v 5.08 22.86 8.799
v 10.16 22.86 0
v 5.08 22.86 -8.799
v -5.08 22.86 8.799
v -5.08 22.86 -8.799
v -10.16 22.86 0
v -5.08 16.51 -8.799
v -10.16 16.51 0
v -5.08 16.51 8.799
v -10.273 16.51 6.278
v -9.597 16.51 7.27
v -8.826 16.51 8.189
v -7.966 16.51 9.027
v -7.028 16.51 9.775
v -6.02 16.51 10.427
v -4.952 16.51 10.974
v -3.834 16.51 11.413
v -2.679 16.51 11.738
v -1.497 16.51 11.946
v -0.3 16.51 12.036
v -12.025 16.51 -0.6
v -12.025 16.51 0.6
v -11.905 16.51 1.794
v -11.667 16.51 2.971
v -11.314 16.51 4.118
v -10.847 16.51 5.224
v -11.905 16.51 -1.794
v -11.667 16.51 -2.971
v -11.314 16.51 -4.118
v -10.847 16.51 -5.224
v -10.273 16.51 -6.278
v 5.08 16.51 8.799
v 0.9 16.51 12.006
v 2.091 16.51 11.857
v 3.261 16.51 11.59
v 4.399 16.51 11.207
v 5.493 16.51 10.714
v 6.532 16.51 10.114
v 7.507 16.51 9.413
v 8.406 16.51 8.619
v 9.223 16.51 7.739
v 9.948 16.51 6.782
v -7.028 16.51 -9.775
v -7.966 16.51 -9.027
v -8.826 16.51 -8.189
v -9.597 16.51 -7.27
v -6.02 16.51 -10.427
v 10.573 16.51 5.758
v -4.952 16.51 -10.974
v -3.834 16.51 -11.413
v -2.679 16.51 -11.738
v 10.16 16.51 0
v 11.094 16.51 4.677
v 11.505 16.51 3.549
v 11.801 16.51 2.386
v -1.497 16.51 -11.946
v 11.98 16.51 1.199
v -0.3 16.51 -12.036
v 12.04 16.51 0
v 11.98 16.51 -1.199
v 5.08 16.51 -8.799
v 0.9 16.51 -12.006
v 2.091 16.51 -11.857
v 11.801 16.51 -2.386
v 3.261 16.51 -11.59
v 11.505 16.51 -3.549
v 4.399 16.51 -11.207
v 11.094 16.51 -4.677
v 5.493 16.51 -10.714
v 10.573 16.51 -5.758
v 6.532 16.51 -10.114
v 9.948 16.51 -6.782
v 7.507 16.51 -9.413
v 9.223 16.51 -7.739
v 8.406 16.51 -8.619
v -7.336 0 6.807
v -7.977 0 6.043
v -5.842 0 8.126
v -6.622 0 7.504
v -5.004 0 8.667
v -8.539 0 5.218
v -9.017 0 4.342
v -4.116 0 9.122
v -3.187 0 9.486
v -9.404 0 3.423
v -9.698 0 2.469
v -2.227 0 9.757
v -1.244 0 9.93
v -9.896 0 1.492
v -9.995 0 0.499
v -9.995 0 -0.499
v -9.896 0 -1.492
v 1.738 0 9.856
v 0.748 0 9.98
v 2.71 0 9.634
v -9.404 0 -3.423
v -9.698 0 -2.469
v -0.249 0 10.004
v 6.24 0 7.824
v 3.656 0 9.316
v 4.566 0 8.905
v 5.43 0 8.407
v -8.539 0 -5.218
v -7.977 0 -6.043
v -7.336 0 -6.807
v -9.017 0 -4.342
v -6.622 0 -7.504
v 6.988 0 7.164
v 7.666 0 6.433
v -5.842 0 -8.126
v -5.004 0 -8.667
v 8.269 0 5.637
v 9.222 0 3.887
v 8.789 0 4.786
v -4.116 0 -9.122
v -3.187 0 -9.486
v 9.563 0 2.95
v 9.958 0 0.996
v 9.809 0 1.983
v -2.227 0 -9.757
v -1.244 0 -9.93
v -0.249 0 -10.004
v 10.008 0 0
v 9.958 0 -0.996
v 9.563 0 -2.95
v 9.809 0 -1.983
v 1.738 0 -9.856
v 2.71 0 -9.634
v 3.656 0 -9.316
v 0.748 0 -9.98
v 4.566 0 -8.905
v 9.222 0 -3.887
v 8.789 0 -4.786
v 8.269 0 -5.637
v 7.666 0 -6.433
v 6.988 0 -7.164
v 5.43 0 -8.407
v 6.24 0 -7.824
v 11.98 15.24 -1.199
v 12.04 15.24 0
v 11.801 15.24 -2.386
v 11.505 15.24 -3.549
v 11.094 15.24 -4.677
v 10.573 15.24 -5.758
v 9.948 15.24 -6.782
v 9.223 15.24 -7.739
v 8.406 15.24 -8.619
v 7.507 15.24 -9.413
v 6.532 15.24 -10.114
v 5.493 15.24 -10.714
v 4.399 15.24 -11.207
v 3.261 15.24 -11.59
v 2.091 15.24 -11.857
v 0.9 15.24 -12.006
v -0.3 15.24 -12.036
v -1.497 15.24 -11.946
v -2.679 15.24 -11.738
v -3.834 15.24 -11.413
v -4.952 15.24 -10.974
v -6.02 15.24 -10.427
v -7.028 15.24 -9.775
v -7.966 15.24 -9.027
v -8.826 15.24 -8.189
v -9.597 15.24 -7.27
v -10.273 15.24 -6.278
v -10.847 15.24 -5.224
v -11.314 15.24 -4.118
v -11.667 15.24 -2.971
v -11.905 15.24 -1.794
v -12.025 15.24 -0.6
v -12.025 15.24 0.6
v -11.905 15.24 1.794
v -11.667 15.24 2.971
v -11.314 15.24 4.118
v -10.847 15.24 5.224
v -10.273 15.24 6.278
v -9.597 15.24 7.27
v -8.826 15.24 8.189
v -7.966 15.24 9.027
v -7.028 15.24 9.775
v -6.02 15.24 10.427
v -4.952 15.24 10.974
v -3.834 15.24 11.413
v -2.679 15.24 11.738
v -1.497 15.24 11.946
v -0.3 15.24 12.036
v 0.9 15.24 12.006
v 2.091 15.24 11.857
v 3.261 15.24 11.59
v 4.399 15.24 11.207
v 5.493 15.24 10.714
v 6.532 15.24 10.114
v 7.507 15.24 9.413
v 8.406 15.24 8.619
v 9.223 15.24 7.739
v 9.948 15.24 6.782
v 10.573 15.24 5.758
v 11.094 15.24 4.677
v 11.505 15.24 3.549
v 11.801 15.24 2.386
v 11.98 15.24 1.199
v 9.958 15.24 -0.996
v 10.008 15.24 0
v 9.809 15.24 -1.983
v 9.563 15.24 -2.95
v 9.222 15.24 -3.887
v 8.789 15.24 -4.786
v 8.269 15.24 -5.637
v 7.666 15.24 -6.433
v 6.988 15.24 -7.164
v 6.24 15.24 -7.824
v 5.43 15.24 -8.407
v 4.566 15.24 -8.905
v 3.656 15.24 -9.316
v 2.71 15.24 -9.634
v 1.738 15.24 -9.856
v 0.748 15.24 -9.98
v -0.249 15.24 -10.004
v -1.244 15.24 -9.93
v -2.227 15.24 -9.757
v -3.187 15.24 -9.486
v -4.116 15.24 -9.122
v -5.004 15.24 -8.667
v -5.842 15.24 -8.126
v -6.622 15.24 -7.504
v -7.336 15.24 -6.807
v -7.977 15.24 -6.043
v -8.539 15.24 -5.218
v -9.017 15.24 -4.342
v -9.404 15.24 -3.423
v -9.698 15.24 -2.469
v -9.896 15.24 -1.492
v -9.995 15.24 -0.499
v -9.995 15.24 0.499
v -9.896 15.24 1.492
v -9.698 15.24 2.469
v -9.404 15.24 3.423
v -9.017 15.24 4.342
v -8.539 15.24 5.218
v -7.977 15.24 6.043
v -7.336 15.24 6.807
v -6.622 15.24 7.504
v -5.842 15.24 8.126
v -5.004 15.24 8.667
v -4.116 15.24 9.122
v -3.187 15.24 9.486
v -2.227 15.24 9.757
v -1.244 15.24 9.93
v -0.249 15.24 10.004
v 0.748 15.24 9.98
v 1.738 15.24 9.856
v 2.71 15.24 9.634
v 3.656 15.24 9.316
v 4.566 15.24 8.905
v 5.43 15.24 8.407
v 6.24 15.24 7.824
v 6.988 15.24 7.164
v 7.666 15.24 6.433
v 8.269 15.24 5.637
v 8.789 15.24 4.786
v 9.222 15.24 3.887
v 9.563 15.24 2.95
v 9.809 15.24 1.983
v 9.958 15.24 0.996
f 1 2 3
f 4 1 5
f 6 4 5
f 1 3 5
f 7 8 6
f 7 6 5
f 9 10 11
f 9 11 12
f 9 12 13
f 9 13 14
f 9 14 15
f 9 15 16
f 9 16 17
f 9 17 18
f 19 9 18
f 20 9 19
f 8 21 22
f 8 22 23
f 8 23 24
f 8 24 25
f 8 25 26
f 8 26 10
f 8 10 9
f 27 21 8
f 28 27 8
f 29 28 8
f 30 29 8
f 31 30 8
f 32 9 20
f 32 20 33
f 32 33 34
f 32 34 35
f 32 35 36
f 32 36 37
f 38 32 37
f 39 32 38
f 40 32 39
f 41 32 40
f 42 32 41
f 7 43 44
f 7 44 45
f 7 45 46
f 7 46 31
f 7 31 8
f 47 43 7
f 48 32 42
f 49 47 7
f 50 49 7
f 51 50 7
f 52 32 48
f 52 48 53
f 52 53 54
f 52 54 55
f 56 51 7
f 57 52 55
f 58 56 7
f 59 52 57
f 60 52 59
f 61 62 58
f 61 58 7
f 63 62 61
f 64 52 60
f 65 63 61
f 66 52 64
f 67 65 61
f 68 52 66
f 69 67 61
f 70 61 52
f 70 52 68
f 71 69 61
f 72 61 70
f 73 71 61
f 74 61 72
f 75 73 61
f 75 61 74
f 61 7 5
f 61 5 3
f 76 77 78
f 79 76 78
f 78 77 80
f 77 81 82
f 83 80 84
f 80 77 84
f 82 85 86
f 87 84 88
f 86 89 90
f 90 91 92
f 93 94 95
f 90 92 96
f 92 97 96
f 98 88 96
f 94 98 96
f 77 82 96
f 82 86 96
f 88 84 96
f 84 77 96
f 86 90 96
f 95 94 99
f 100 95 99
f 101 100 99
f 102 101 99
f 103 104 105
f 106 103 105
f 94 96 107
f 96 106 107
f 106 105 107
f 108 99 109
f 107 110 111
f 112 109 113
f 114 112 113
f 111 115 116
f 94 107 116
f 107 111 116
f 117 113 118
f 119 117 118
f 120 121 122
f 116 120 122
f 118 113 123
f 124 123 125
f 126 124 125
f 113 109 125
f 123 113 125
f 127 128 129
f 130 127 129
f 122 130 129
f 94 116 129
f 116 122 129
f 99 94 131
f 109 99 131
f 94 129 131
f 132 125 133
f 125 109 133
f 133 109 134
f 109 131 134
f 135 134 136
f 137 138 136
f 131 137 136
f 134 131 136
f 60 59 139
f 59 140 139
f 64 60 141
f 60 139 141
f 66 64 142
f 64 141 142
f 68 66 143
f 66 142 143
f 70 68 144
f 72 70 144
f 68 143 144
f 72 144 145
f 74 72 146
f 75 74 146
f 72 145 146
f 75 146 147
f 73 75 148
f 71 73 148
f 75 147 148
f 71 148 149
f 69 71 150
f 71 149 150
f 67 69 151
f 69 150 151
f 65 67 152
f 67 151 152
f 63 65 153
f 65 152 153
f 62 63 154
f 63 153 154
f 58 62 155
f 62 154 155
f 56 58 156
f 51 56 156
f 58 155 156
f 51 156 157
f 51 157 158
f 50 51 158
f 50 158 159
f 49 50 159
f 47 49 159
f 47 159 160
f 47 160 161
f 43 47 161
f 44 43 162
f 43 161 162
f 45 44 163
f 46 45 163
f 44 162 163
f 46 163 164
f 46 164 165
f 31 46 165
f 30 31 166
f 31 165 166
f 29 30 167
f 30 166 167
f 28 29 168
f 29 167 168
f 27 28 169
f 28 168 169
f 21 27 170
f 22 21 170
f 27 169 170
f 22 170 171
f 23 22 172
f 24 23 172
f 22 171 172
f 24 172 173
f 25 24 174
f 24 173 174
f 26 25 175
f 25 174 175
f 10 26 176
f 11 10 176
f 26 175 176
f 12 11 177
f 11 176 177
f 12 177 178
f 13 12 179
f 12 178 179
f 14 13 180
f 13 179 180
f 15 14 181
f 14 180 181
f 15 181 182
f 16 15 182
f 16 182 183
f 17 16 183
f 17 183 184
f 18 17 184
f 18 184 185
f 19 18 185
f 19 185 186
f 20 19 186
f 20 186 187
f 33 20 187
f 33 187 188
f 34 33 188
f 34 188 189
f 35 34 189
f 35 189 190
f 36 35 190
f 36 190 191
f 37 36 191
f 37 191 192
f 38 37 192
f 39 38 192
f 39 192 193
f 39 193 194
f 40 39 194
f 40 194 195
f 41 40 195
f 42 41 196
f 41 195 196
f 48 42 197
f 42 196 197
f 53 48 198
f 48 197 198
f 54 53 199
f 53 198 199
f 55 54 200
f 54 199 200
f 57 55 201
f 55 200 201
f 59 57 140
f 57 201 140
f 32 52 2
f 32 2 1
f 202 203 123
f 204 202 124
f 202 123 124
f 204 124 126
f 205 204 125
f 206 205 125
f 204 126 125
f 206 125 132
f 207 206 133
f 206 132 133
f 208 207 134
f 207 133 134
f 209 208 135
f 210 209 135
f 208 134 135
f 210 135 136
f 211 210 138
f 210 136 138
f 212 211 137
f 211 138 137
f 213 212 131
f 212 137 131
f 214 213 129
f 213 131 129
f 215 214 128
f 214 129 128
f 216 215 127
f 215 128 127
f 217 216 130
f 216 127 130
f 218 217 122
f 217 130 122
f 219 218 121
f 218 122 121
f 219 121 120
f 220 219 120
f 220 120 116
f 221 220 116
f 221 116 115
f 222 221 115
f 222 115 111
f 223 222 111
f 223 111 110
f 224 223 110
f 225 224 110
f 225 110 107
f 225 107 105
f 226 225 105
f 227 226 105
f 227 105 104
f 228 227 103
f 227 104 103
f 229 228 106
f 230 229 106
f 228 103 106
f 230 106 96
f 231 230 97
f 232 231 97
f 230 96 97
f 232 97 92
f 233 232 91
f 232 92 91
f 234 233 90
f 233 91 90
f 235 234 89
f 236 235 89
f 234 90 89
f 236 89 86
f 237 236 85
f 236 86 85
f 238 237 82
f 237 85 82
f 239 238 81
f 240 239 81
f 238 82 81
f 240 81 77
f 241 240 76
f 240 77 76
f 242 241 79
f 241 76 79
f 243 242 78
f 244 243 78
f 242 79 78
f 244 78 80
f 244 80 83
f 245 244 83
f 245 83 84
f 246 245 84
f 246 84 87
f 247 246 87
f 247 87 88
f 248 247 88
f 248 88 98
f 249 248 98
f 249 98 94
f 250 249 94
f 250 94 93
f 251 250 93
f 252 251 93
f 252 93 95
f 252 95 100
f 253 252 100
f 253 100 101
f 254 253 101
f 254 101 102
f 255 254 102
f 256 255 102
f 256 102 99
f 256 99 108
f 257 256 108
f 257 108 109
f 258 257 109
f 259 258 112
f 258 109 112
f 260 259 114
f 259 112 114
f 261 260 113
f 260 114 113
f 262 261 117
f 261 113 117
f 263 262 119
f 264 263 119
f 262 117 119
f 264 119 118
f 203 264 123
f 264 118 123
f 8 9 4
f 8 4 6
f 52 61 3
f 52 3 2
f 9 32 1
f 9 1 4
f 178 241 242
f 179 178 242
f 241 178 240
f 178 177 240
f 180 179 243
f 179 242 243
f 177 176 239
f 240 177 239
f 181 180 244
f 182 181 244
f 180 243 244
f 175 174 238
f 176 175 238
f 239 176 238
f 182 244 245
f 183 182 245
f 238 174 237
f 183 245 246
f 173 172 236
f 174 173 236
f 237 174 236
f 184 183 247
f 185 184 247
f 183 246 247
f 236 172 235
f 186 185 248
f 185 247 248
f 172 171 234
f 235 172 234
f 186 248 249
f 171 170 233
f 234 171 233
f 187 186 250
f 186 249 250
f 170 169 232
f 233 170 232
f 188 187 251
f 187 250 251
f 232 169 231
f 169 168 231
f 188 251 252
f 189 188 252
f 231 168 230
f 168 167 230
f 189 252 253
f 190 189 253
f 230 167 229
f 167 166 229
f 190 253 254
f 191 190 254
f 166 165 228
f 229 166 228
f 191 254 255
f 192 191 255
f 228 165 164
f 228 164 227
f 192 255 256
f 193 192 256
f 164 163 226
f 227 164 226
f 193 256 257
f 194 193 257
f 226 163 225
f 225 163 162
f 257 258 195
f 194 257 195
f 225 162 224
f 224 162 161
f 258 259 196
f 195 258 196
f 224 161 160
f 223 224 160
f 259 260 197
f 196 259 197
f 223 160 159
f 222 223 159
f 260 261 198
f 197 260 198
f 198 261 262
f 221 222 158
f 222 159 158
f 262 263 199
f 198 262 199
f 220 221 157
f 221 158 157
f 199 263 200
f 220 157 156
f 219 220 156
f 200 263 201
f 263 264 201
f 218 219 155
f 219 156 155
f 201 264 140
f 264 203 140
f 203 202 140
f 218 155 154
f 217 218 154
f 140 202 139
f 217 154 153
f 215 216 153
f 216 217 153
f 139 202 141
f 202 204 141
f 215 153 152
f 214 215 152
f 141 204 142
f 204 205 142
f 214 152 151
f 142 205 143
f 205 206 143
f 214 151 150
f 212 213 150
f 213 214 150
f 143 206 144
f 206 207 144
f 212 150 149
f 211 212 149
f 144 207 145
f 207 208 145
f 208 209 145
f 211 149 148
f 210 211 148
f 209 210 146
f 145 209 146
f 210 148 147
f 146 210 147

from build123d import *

# Parameters (mm, degrees)
CUT_EXTRUDE1_START = -6.35
CUT_EXTRUDE1_DEPTH = 6.35


with BuildPart() as part:
    # Sketch1 → Revolve1 (revolve)
    with BuildSketch(Plane.XY):
        Polygon((0, 0), (0, 15.24), (0, 22.86), (10.16, 22.86), (10.16, 16.51), (12.0396, 16.51), (12.0396, 15.24), (10.0076, 15.24), (10.0076, 0), align=None)
    revolve(axis=Axis((0, 0, 0), (0, 1, 0)))

    # Sketch2 → Cut-Extrude1 (cut)
    with BuildSketch(Plane(origin=(0, 22.86, 0), x_dir=(1, 0, 0), z_dir=(0, 1, 0)).offset(CUT_EXTRUDE1_START)):
        with BuildLine():
            ThreePointArc((5.08, 8.798818102), (0, 10.16), (-5.08, 8.798818102))
            Line((-5.08, 8.798818102), (5.08, 8.798818102))
        make_face()
        with BuildLine():
            Line((-10.16, 0), (-5.08, 8.798818102))
            ThreePointArc((-5.08, 8.798818102), (-8.798818102, 5.08), (-10.16, 0))
        make_face()
        with BuildLine():
            Line((-5.08, -8.798818102), (-10.16, 0))
            ThreePointArc((-10.16, 0), (-8.798818102, -5.08), (-5.08, -8.798818102))
        make_face()
        with BuildLine():
            ThreePointArc((10.16, 0), (8.798818102, 5.08), (5.08, 8.798818102))
            Line((5.08, 8.798818102), (10.16, 0))
        make_face()
        with BuildLine():
            Line((5.08, -8.798818102), (-5.08, -8.798818102))
            ThreePointArc((-5.08, -8.798818102), (0, -10.16), (5.08, -8.798818102))
        make_face()
        with BuildLine():
            ThreePointArc((5.08, -8.798818102), (8.798818102, -5.08), (10.16, 0))
            Line((10.16, 0), (5.08, -8.798818102))
        make_face()
    extrude(amount=CUT_EXTRUDE1_DEPTH, mode=Mode.SUBTRACT)


solid = part.part
